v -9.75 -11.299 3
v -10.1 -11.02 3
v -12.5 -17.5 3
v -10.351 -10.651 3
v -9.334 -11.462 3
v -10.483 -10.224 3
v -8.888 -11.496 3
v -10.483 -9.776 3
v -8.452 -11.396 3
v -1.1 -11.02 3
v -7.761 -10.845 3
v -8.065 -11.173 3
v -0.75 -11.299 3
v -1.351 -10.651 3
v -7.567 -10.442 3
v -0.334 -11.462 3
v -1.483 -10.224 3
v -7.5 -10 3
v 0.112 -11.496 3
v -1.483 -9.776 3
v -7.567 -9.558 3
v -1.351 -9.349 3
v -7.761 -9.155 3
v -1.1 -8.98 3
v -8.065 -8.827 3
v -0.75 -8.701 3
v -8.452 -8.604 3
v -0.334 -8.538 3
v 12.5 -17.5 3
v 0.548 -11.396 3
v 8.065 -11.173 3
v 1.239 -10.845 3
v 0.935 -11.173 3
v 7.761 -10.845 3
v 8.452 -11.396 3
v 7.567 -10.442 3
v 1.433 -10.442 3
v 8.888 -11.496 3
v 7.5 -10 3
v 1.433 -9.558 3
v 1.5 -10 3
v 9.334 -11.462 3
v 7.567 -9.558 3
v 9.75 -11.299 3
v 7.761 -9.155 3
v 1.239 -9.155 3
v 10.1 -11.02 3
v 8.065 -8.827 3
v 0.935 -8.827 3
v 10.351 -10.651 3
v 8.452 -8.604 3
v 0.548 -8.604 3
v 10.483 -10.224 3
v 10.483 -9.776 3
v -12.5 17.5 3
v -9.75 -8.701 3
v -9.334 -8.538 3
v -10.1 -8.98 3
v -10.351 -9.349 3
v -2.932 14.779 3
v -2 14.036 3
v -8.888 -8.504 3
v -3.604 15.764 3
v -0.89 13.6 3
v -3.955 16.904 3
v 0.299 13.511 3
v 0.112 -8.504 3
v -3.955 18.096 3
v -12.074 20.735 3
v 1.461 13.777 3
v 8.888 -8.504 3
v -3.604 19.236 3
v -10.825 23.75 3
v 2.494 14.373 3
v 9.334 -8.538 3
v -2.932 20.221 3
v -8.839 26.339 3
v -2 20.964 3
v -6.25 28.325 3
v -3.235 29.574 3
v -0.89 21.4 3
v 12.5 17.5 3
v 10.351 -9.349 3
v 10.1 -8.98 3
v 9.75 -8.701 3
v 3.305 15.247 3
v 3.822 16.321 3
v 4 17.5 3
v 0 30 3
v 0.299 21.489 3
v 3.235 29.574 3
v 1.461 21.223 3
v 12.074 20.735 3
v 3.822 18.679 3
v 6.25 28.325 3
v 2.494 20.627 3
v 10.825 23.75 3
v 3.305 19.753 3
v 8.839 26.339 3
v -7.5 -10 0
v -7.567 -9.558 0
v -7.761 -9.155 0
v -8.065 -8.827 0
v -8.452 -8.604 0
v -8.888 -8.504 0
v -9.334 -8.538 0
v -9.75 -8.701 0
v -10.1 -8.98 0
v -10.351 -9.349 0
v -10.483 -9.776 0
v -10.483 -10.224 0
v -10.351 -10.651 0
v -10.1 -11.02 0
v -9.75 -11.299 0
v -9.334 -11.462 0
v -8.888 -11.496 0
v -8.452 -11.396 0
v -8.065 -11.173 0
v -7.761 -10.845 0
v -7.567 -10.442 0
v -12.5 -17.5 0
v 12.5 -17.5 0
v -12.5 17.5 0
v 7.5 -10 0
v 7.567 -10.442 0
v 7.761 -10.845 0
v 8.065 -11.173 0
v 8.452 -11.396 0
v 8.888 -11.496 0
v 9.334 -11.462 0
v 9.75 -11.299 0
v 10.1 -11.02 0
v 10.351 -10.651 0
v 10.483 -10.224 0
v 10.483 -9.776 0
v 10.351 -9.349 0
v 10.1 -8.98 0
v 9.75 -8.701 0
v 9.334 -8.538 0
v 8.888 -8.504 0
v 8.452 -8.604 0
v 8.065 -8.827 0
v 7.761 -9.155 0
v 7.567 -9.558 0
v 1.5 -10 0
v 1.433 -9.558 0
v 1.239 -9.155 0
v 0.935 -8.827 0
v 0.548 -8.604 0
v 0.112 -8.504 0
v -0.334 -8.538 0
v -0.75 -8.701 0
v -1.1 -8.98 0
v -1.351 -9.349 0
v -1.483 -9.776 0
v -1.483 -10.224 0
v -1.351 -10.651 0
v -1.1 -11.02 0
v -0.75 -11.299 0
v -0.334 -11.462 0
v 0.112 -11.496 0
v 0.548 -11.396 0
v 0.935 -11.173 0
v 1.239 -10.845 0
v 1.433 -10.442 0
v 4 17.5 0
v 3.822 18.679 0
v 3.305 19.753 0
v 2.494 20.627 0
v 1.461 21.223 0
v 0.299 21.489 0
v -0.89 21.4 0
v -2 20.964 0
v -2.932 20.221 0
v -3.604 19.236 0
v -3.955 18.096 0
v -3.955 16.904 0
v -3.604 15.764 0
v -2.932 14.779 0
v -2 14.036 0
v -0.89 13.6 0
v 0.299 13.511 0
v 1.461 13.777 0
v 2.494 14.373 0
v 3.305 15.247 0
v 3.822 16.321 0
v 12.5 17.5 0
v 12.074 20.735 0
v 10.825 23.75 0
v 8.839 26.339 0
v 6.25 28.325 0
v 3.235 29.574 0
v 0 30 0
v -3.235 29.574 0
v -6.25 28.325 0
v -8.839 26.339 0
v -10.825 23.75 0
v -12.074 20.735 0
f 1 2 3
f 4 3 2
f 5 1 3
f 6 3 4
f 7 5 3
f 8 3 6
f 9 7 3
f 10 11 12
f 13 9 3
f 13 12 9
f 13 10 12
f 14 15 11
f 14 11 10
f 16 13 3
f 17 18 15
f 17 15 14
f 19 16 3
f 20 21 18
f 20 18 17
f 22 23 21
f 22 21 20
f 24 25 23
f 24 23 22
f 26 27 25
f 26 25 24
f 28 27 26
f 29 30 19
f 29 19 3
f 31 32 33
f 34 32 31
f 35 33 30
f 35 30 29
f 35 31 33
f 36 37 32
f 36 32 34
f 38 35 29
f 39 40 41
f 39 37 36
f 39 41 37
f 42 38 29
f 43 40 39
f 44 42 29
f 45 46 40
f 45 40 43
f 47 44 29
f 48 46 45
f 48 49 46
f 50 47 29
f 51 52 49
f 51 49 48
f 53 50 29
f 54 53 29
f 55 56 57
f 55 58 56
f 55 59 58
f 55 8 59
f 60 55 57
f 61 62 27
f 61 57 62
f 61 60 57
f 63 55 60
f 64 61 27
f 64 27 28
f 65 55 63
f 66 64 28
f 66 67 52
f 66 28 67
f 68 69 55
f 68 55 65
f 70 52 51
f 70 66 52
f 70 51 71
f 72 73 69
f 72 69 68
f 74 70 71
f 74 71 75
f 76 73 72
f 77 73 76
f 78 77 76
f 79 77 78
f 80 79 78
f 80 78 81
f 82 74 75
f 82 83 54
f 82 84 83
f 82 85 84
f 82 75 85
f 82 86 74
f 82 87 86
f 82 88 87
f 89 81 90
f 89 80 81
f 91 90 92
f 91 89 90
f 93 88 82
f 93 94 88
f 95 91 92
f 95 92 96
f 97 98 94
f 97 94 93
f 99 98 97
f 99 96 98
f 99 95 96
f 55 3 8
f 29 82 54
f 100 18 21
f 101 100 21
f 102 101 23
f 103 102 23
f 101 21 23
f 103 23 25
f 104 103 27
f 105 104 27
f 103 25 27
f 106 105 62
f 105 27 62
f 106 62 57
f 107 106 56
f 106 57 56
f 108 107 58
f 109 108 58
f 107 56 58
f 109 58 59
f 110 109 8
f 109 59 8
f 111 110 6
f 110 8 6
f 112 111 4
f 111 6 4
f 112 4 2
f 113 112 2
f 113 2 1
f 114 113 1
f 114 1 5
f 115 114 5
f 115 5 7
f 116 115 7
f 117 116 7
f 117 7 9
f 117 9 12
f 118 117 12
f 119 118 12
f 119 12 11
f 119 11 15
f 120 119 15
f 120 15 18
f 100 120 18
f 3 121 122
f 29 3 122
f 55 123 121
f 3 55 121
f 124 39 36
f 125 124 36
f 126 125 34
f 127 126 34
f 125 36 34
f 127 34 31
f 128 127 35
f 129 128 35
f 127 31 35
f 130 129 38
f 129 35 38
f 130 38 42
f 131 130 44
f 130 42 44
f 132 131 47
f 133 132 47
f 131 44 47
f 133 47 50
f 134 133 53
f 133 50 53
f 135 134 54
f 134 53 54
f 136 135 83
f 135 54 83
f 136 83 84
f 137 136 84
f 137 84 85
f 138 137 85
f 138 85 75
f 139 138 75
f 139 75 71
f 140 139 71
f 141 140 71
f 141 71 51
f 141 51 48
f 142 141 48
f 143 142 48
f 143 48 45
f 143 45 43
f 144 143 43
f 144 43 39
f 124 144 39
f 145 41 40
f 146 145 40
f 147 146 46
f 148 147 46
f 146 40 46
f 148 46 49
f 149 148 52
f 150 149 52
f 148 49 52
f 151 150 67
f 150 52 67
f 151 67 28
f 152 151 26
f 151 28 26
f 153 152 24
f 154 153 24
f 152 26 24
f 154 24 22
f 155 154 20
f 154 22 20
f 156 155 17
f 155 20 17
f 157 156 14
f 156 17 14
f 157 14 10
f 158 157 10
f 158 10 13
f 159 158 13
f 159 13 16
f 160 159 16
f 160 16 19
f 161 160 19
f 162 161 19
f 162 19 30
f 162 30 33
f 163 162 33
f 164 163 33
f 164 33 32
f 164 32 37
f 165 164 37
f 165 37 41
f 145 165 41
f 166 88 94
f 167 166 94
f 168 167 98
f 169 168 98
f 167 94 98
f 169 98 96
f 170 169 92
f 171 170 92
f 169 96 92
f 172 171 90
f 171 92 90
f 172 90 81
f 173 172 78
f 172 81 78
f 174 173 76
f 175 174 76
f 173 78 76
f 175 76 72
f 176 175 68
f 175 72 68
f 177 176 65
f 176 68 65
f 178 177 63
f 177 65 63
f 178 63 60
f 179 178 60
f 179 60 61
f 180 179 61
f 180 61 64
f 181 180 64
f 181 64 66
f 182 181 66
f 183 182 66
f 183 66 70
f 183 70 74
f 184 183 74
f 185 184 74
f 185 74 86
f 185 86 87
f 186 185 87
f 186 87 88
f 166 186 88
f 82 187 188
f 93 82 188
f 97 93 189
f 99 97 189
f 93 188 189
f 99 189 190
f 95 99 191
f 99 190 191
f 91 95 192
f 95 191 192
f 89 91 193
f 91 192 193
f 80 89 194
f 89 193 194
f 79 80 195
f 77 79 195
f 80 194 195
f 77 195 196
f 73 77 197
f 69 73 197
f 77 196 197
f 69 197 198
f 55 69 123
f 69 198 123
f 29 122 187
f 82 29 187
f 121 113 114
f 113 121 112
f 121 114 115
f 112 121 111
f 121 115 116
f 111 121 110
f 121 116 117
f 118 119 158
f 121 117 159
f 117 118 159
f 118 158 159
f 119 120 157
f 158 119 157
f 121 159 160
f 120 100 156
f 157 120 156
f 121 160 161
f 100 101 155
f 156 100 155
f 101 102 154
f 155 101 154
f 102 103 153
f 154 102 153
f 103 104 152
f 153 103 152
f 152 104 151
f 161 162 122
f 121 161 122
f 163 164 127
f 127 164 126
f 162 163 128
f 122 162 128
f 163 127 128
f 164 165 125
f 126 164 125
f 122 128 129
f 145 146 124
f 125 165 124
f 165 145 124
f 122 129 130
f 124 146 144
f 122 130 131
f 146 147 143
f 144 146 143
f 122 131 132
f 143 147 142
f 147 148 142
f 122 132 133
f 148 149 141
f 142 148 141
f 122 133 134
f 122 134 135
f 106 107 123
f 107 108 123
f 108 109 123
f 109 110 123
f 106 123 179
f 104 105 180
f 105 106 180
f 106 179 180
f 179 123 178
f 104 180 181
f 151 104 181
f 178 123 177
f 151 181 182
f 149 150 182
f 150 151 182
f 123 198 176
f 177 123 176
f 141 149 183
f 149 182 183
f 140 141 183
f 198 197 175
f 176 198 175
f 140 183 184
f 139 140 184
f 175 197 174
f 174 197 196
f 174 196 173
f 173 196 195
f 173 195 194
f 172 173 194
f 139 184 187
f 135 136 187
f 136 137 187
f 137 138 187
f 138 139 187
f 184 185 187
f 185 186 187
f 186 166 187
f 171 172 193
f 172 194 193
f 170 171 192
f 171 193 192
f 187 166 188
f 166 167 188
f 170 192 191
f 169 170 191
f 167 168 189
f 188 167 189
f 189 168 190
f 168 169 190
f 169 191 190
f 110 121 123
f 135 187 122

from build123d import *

# Parameters (mm, degrees)
EXTRUDE_1_DEPTH     = 3
SKETCH_3_R          = 4
CUT_EXTRUDE_1_DEPTH = 33.638167841
SKETCH_4_R          = 1.5
CUT_EXTRUDE_2_DEPTH = 33.638167841


with BuildPart() as part:
    # 草图2 → 凸台-拉伸1 (new body)
    with BuildSketch(Plane.XY):
        with BuildLine():
            Line((-12.5, 17.5), (-12.5, -17.5))
            Line((-12.5, -17.5), (12.5, -17.5))
            Line((12.5, -17.5), (12.5, 17.5))
            ThreePointArc((12.5, 17.5), (0, 30), (-12.5, 17.5))
        make_face()
    extrude(amount=EXTRUDE_1_DEPTH)

    # 草图3 → 切除-拉伸1 (cut, through all)
    with BuildSketch(Plane.XY.offset(3)):
        with Locations((0, 17.5)):
            Circle(SKETCH_3_R)
    extrude(amount=-CUT_EXTRUDE_1_DEPTH, mode=Mode.SUBTRACT)

    # 草图4 → 切除-拉伸2 (cut, through all)
    with BuildSketch(Plane.XY.offset(3)):
        with Locations((-9, -10)):
            Circle(SKETCH_4_R)
        with Locations((0, -10)):
            Circle(SKETCH_4_R)
        with Locations(Location((9, -10, 0), (0, 0, 180))):
            Circle(SKETCH_4_R)
    extrude(amount=-CUT_EXTRUDE_2_DEPTH, mode=Mode.SUBTRACT)


solid = part.part
